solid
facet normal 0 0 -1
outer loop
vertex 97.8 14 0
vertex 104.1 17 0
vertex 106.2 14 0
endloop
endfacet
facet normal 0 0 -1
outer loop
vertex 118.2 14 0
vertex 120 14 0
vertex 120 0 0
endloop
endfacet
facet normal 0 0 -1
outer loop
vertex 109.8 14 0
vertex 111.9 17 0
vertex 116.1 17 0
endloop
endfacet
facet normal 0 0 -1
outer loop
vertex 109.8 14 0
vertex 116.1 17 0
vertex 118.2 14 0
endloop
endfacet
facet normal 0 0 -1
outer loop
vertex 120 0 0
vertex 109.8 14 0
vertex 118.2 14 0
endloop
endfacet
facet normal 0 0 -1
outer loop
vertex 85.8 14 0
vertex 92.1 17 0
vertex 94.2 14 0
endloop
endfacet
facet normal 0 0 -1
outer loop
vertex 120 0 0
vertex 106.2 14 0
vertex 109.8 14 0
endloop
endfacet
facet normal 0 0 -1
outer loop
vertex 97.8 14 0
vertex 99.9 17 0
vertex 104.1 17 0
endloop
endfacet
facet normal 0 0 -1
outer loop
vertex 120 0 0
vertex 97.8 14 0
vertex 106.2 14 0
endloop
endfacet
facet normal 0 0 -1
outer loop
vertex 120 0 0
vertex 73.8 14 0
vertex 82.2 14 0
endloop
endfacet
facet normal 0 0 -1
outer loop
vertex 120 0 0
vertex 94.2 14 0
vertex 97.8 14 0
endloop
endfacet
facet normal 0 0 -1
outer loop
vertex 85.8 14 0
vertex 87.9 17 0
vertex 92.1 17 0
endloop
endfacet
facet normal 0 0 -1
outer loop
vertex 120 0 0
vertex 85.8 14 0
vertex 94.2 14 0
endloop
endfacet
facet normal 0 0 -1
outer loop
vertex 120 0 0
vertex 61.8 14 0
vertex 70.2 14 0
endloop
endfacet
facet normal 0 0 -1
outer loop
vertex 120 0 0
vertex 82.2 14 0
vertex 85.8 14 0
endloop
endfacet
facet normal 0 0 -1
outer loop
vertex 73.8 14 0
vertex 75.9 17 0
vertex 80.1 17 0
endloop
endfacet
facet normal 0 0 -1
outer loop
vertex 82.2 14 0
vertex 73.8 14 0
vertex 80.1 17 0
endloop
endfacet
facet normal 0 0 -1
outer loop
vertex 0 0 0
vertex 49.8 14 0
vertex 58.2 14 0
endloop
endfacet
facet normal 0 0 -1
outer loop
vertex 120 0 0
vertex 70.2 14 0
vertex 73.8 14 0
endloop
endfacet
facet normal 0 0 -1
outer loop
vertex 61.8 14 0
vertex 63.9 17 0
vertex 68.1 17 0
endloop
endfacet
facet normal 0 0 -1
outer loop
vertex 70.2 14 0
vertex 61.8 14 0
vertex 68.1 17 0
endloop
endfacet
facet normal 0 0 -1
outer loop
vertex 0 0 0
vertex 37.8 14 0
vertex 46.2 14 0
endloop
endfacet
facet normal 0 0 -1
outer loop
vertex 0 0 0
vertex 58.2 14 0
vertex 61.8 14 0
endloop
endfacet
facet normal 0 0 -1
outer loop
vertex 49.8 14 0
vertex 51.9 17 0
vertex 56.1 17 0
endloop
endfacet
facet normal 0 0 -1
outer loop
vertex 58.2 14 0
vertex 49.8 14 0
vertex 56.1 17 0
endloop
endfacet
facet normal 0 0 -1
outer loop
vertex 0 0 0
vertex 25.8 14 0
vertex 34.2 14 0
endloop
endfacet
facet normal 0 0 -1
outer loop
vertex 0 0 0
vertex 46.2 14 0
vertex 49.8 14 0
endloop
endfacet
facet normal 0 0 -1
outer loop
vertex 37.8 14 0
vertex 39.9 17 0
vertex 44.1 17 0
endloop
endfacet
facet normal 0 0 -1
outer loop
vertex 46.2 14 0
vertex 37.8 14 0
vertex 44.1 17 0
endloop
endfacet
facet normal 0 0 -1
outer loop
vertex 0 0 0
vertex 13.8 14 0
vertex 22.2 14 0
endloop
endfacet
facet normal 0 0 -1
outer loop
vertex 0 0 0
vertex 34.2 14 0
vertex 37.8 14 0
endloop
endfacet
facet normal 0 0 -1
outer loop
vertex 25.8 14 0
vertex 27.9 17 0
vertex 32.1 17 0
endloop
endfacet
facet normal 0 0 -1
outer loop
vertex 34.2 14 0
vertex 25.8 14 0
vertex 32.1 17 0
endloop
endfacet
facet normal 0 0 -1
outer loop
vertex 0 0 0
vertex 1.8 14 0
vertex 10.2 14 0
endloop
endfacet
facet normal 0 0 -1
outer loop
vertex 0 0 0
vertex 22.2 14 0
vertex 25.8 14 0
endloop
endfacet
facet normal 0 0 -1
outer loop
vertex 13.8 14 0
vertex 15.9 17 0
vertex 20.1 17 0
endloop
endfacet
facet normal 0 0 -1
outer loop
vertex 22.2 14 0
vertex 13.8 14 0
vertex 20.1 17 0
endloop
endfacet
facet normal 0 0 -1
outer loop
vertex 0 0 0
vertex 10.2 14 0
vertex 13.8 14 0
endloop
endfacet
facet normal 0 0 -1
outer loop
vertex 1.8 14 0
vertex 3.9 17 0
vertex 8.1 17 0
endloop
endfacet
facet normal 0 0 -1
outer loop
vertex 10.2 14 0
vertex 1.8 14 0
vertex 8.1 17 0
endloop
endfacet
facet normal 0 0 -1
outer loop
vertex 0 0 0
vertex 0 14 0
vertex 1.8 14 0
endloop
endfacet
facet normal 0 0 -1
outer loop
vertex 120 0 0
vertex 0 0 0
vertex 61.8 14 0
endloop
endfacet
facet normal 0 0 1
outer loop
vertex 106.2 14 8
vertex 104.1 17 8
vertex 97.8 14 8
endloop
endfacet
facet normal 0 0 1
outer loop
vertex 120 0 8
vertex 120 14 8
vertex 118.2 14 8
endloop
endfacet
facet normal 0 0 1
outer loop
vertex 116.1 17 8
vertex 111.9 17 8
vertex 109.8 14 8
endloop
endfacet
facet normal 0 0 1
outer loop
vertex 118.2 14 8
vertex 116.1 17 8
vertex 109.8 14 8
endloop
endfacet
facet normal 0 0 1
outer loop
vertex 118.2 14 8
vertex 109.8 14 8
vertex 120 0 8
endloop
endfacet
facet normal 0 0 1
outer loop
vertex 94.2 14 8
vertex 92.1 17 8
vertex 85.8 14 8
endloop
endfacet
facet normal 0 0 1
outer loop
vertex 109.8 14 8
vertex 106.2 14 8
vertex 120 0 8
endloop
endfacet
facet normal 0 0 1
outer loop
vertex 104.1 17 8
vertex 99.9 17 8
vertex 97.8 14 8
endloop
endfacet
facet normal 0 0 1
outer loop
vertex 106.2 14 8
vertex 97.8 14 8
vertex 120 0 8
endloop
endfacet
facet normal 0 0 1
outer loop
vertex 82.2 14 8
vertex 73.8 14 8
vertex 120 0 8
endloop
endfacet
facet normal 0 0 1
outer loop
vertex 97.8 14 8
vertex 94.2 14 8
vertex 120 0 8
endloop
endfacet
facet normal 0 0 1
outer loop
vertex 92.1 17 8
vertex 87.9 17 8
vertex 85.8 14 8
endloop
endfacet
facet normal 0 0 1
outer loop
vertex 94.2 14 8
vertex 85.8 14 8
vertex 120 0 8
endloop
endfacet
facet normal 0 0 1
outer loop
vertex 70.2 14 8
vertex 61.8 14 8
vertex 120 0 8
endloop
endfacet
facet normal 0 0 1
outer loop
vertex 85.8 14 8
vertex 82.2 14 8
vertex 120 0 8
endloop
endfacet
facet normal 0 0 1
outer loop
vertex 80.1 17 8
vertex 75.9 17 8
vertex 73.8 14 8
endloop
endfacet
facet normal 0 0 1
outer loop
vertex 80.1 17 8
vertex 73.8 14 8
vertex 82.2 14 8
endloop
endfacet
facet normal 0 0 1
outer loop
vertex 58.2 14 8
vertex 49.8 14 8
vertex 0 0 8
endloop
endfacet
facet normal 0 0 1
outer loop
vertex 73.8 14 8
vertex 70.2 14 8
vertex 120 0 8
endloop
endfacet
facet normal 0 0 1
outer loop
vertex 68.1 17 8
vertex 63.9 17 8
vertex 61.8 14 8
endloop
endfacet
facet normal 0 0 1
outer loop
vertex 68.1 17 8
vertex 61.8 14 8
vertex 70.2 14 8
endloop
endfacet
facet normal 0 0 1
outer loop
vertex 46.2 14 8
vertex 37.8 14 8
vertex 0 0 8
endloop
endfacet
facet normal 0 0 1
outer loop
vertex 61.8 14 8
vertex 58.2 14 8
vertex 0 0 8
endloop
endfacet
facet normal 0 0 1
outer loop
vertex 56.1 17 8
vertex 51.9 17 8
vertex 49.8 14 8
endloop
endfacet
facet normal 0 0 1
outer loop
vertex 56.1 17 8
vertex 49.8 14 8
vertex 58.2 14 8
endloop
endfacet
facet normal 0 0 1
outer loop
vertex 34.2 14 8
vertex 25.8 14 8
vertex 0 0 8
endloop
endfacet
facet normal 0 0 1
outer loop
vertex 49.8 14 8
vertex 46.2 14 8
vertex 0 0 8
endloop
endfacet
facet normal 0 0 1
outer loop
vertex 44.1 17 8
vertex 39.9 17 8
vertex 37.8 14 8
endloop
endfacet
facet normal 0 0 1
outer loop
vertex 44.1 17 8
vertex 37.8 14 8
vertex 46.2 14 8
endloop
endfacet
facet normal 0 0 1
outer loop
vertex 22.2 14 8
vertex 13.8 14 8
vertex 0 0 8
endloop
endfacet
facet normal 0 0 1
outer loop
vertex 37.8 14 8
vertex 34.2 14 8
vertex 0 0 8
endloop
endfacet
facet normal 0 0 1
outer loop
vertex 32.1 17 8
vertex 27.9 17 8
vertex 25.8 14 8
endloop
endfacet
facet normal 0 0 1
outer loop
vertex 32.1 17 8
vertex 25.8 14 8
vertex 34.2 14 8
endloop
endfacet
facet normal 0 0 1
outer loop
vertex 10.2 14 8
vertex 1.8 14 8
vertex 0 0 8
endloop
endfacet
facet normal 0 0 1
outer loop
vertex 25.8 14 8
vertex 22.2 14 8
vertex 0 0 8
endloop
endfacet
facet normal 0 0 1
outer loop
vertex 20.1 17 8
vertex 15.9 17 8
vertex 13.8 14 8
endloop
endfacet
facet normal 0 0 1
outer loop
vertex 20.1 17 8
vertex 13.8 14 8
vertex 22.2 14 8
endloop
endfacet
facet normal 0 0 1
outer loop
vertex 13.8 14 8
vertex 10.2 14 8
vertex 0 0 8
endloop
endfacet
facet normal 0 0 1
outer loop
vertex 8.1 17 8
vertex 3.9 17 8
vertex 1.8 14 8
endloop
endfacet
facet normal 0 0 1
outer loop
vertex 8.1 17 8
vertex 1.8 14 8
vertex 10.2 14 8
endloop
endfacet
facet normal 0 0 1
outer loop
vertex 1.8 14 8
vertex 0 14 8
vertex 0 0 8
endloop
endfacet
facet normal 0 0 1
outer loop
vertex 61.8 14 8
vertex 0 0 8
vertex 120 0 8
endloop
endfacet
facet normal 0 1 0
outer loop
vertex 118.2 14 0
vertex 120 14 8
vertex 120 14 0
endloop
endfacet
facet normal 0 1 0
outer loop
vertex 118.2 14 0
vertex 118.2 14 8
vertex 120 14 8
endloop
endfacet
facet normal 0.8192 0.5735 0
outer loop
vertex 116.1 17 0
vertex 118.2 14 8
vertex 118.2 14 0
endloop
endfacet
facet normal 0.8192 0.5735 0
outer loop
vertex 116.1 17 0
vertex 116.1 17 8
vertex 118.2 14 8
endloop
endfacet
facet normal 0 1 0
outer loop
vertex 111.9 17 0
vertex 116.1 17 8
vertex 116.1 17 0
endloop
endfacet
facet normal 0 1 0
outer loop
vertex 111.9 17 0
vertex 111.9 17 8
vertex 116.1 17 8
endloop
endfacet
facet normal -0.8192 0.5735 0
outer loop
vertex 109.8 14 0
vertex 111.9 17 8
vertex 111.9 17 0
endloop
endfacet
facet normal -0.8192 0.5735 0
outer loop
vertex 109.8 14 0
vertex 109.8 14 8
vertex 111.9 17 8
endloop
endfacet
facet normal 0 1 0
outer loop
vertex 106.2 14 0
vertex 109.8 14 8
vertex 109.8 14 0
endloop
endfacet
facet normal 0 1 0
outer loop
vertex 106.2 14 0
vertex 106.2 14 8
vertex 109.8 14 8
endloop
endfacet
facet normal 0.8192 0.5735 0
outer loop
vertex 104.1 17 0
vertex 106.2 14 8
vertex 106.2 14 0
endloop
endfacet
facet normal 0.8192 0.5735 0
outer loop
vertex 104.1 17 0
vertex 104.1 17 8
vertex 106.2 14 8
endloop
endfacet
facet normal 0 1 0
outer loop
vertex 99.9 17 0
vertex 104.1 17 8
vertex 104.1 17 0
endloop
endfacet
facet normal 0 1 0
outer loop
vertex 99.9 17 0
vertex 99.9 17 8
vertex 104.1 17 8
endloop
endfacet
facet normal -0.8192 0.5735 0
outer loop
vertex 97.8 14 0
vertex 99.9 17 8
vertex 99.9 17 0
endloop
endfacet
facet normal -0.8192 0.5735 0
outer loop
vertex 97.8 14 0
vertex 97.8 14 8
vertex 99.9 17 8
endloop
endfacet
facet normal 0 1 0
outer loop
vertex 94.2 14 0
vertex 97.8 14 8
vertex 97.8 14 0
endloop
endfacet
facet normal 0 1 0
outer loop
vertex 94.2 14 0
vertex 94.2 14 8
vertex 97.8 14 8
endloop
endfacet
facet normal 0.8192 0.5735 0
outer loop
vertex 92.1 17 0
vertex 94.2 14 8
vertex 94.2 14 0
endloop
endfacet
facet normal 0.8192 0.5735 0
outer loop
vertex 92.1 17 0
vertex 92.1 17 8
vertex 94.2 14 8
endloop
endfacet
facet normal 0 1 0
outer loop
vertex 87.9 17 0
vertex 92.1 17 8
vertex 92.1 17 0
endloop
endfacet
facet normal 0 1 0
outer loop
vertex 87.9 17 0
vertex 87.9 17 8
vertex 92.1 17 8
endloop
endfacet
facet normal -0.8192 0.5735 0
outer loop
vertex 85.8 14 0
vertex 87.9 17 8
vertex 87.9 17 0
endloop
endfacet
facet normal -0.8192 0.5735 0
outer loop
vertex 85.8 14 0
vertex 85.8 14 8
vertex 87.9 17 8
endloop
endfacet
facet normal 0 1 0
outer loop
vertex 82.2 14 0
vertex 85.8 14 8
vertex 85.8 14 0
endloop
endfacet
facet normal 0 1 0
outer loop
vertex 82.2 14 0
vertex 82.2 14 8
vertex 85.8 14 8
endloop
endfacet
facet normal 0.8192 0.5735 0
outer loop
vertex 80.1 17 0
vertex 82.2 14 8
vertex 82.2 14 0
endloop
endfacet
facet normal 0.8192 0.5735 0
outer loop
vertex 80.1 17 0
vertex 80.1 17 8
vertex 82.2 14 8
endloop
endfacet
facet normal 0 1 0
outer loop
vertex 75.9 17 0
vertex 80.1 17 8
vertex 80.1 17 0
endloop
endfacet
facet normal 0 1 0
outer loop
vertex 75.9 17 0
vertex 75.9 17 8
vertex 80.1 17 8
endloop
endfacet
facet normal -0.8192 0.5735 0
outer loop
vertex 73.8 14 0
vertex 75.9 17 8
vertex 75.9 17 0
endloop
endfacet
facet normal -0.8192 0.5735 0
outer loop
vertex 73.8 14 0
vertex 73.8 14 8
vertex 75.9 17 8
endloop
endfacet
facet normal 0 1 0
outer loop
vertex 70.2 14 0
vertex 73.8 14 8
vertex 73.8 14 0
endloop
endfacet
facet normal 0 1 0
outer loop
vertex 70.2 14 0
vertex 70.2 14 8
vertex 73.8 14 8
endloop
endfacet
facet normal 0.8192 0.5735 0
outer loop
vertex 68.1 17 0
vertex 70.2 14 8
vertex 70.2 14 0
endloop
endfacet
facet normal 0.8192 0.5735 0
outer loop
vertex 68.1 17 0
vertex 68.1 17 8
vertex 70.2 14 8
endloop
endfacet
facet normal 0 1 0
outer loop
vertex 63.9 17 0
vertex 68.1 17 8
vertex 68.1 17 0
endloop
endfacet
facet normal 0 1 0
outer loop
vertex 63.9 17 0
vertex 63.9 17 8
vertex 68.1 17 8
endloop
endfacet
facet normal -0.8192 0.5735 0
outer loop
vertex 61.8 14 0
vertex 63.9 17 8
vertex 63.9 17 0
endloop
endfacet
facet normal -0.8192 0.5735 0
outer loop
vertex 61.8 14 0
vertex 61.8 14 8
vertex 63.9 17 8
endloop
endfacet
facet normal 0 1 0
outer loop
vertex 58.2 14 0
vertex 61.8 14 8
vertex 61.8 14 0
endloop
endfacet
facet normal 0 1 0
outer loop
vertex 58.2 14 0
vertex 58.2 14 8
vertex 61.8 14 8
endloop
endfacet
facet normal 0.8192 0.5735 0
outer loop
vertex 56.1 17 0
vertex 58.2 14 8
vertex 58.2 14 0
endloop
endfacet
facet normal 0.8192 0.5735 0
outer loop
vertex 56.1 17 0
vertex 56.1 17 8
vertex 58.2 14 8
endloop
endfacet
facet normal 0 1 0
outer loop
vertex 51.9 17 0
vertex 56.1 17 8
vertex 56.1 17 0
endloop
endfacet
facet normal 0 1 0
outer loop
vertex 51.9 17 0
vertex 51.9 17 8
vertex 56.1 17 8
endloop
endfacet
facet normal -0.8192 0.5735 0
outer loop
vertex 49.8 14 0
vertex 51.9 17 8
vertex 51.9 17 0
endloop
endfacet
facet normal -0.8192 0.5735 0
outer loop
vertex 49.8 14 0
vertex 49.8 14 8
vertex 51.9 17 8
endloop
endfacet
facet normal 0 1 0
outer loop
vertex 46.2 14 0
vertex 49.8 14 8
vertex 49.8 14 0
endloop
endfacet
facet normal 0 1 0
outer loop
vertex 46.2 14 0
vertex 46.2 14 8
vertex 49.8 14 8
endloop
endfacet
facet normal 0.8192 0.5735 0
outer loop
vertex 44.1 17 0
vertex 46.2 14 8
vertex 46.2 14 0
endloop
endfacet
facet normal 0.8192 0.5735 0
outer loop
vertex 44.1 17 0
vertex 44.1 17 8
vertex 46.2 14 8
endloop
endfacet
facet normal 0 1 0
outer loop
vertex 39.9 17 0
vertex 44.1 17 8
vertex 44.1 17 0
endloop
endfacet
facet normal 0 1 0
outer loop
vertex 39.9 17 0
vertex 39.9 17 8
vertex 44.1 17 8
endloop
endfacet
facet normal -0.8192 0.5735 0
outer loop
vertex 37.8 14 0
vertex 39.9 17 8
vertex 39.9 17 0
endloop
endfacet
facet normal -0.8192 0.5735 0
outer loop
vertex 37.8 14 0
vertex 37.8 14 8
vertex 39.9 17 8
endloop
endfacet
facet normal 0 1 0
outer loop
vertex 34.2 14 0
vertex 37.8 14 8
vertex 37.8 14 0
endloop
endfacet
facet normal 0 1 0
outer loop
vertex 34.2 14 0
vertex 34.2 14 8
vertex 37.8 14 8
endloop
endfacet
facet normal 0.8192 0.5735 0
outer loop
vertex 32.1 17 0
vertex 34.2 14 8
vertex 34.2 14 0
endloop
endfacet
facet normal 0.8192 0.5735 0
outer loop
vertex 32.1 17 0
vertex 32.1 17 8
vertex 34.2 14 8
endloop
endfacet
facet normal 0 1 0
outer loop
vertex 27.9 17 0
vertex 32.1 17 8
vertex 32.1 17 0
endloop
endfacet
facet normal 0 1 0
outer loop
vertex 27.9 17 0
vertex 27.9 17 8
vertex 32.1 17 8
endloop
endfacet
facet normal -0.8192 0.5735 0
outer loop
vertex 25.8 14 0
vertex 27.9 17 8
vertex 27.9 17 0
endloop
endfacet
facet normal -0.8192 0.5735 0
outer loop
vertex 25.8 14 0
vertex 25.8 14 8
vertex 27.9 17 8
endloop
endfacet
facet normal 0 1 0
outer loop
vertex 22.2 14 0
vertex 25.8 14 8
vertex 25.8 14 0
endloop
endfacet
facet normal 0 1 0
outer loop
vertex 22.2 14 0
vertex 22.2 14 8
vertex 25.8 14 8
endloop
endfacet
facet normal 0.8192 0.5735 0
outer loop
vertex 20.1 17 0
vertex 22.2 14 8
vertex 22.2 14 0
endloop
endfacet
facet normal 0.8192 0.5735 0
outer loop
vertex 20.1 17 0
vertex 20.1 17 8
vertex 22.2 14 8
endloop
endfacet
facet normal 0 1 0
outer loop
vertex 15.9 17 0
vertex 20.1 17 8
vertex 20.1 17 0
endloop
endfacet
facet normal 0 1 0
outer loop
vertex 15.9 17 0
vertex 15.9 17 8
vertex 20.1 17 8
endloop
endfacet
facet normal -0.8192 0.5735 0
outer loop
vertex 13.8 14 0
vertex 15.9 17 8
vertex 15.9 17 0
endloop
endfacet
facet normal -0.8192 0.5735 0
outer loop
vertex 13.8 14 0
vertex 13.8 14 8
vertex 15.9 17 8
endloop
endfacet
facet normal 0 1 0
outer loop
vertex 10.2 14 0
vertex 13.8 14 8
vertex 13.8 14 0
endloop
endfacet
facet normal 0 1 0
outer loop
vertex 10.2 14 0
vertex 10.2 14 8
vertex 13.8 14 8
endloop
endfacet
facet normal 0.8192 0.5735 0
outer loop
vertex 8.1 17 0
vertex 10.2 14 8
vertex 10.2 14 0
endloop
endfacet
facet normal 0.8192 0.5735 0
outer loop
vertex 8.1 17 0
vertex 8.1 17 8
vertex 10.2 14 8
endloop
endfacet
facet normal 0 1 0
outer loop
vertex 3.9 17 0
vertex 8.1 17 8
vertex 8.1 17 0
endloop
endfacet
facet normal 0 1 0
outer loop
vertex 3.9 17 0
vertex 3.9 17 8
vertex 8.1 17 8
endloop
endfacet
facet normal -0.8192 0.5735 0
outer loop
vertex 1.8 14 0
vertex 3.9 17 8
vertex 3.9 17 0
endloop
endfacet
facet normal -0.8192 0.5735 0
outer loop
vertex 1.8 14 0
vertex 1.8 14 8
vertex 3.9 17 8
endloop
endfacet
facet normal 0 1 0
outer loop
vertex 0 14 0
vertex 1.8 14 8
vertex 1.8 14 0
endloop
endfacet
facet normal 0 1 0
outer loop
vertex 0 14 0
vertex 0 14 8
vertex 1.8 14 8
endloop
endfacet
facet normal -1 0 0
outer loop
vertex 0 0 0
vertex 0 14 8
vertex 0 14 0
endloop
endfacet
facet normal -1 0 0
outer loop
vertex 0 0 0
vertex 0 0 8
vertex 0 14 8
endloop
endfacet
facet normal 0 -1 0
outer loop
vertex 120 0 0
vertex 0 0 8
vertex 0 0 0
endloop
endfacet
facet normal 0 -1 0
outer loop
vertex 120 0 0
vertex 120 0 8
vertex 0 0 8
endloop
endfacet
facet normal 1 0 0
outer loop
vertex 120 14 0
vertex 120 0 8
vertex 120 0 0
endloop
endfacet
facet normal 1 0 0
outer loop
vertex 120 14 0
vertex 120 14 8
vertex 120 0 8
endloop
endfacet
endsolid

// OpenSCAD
$fn = 32;

// ----------------------------------------------------------------------
// Gear rack: 10 teeth, pitch 12 mm
// ----------------------------------------------------------------------

// --- parameters (mm) ---
teeth = 10;               // number of teeth
pitch = 12;               // tooth pitch, X
root_w = 8.4;             // tooth width at the root
tip_w = 4.2;              // tooth width at the tip
base_h = 14;              // rack body height, Y
tooth_h = 3;              // tooth height above the body
plate_t = 8;              // rack width, Z (extrusion height)
fit_tol = 0.02;           // declared fit tolerance (prompt contract)
free_tol = 0.2;           // declared free tolerance (prompt contract)

rack_l = teeth * pitch;  // overall length
total_h = base_h + tooth_h;  // overall height

profile = [[0, 0], [120, 0], [120, 14], [118.2, 14], [116.1, 17], [111.9, 17], [109.8, 14], [106.2, 14], [104.1, 17], [99.9, 17], [97.8, 14], [94.2, 14], [92.1, 17], [87.9, 17], [85.8, 14], [82.2, 14], [80.1, 17], [75.9, 17], [73.8, 14], [70.2, 14], [68.1, 17], [63.9, 17], [61.8, 14], [58.2, 14], [56.1, 17], [51.9, 17], [49.8, 14], [46.2, 14], [44.1, 17], [39.9, 17], [37.8, 14], [34.2, 14], [32.1, 17], [27.9, 17], [25.8, 14], [22.2, 14], [20.1, 17], [15.9, 17], [13.8, 14], [10.2, 14], [8.1, 17], [3.9, 17], [1.8, 14], [0, 14]];  // primary outline, 44 points, counter clockwise

// --- the one profile operation ---
linear_extrude(height = plate_t) polygon(points = profile);
